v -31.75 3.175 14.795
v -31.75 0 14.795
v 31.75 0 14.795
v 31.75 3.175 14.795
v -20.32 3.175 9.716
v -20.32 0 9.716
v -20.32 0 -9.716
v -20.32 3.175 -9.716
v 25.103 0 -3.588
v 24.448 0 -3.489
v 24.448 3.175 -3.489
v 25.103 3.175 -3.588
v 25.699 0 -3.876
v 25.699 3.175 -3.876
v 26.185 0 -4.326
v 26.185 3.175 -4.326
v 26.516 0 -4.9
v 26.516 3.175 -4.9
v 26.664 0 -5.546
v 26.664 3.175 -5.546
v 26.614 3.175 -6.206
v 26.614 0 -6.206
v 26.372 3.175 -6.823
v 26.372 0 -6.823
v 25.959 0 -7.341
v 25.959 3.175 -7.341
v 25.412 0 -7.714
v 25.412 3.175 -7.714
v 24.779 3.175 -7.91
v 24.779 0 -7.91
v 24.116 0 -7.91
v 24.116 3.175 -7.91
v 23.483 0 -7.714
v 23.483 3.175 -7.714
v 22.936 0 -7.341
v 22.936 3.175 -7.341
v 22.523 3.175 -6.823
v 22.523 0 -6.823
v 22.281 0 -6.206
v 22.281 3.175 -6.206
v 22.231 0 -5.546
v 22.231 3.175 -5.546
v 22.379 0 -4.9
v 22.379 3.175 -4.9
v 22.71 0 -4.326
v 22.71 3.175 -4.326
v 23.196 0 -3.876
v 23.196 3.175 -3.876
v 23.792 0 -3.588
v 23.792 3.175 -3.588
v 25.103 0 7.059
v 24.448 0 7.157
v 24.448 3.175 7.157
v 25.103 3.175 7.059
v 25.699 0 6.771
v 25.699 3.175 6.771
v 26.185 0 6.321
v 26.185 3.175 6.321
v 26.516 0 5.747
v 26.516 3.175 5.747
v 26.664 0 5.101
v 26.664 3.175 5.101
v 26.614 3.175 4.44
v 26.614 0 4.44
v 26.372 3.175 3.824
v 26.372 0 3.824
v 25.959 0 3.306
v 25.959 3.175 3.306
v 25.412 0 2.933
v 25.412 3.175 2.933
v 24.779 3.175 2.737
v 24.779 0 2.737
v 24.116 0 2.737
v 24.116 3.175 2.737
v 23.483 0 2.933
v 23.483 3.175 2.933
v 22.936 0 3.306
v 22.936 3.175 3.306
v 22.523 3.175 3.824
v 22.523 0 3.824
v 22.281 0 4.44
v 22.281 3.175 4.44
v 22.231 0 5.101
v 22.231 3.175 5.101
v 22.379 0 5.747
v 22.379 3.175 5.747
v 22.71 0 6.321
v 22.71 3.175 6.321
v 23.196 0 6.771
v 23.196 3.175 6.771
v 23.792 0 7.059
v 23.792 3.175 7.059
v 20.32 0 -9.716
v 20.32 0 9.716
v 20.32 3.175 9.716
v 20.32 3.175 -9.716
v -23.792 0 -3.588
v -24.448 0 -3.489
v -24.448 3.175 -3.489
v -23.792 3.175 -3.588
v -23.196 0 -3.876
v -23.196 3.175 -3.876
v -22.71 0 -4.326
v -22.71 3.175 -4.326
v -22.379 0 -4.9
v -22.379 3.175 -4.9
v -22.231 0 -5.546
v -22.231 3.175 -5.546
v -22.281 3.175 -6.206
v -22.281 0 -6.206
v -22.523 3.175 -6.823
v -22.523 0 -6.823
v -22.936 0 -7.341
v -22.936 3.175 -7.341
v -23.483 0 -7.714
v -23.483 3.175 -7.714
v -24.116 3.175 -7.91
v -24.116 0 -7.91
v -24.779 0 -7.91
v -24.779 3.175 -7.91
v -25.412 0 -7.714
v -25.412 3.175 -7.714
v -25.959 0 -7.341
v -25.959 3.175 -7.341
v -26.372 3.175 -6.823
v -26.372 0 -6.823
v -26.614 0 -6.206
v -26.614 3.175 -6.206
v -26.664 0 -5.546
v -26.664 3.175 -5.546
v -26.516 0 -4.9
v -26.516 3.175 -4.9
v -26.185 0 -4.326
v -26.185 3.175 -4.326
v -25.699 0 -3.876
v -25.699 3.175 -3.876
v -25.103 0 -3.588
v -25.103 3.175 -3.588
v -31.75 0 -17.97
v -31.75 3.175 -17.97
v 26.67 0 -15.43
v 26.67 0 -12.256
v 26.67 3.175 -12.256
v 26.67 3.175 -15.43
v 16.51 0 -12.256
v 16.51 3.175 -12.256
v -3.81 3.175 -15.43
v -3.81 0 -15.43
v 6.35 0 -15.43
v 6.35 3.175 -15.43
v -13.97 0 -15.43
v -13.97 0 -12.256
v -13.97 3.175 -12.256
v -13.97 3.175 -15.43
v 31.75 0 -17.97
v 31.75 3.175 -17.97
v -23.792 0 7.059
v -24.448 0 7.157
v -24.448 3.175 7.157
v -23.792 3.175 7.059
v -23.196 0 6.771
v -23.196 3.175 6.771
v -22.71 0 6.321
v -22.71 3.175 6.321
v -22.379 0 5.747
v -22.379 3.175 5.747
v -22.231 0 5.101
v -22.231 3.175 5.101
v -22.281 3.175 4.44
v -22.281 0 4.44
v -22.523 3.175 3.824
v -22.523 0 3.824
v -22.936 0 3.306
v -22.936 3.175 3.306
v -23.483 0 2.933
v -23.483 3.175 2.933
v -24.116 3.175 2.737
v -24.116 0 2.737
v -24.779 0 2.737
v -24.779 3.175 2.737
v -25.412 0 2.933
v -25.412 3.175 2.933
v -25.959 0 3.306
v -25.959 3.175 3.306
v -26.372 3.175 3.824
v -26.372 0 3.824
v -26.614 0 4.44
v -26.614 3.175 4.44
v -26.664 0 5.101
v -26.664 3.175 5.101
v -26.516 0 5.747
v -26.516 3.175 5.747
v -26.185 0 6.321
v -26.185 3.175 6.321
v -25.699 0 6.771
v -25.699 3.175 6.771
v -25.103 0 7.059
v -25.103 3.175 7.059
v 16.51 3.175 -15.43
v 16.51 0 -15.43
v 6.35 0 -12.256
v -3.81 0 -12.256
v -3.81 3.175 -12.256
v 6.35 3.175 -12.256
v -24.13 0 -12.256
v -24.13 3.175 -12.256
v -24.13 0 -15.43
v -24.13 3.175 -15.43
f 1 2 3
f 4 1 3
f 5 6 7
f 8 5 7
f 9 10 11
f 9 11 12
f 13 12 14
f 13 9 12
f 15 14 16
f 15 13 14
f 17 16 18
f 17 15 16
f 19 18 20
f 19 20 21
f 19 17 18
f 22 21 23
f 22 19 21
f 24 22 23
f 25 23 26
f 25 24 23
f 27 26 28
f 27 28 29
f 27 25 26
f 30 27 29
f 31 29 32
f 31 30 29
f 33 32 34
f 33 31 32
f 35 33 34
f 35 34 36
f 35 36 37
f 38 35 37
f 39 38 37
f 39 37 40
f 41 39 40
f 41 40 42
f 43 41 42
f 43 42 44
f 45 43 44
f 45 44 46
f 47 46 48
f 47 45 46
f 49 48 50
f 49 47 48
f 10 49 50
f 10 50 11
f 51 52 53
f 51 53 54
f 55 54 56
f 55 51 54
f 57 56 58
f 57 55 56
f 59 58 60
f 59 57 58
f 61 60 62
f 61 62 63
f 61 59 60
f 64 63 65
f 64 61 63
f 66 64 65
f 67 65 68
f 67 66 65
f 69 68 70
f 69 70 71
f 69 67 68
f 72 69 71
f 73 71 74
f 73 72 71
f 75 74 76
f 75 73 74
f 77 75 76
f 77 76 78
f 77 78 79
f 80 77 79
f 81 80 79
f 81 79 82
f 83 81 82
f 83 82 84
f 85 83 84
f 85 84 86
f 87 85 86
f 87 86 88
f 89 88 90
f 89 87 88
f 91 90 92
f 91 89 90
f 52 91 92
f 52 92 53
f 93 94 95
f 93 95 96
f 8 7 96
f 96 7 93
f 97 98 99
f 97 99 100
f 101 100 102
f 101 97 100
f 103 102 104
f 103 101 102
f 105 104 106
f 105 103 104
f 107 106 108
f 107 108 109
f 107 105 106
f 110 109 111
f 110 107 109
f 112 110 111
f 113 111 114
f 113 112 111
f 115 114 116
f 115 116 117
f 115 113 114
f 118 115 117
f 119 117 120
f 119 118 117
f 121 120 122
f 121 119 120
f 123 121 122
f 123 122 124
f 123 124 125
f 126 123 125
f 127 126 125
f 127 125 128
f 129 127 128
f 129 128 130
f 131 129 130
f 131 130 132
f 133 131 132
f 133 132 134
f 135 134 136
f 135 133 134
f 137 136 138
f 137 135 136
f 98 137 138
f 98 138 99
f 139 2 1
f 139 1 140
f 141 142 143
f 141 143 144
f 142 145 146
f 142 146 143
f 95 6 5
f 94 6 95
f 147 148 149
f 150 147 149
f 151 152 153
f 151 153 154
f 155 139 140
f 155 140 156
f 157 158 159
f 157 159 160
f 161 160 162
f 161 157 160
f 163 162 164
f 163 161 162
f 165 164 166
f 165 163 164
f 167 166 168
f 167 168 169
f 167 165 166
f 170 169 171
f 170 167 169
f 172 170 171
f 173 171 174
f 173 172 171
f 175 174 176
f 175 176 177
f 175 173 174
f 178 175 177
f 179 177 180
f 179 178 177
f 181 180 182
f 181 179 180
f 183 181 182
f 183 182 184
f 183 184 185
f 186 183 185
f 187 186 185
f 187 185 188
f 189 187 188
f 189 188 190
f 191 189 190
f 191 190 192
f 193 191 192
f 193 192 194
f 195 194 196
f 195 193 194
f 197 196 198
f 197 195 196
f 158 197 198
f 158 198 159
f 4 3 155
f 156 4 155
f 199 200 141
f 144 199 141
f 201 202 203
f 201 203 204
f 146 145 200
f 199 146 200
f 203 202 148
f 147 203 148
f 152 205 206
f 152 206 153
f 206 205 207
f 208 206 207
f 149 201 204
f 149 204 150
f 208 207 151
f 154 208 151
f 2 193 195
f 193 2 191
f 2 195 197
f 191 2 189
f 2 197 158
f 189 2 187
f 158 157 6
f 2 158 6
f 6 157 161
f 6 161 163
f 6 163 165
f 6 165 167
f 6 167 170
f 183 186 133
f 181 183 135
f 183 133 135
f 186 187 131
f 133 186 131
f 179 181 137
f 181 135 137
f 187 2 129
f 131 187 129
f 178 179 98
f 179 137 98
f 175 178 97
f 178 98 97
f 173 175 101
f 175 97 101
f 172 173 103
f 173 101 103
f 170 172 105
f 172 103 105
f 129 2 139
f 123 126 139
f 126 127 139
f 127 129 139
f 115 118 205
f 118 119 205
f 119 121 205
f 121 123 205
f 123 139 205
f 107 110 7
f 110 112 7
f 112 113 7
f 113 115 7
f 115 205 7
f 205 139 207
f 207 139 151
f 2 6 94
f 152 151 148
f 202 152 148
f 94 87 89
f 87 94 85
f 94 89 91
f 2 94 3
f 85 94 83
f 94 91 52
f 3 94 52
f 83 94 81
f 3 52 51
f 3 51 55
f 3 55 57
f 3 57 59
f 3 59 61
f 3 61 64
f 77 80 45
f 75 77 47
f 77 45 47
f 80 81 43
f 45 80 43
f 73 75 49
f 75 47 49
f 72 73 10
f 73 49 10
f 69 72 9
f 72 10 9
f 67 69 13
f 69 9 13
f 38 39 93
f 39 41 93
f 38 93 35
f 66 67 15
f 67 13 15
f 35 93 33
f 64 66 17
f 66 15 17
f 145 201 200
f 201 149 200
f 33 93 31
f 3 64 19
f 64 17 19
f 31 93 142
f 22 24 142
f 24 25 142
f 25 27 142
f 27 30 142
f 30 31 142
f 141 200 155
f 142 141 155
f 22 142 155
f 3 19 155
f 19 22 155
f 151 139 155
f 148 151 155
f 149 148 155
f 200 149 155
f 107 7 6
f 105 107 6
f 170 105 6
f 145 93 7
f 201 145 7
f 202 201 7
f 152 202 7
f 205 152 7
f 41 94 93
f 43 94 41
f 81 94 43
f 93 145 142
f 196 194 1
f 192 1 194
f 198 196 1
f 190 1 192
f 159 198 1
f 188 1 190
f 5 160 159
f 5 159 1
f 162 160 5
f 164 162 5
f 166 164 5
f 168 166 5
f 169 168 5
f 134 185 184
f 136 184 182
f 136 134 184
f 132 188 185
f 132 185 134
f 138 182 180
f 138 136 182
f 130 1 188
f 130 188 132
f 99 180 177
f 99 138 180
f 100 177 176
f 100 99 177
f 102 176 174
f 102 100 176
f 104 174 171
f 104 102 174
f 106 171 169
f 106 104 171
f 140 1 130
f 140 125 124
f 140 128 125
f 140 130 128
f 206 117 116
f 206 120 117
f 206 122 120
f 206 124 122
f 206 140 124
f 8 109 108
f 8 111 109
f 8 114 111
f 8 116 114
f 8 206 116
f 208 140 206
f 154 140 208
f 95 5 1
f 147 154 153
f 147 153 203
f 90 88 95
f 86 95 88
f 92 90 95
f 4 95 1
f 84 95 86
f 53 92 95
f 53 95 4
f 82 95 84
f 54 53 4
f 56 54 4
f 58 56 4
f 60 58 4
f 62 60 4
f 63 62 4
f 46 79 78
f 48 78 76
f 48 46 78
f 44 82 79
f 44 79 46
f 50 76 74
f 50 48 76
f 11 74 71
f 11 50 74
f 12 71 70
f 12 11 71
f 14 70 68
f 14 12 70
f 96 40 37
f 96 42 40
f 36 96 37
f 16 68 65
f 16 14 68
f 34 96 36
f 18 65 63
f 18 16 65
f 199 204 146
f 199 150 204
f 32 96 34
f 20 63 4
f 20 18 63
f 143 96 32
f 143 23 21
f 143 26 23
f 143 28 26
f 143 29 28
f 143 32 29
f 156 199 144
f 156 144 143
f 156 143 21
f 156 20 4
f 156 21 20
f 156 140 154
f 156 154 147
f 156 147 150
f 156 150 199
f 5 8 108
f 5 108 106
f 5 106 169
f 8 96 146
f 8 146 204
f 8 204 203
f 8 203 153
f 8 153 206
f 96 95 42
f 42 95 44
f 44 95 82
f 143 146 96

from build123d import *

# Parameters (mm, degrees)
SKETCH1_W           = 63.5
SKETCH1_H           = 32.766
SKETCH1_R           = 2.2225
SKETCH1_W_2         = 10.16
SKETCH1_H_2         = 3.175
SKETCH1_W_3         = 40.64
SKETCH1_H_3         = 19.431
BOSS_EXTRUDE2_DEPTH = 3.175


with BuildPart() as part:
    # Sketch1 → Boss-Extrude2 (new body)
    with BuildSketch(Plane(origin=(0, 0, 0), x_dir=(1, 0, 0), z_dir=(0, 1, 0))):
        with Locations((0, 1.5875)):
            Rectangle(SKETCH1_W, SKETCH1_H)
        with Locations(Location((-24.4475, 5.711910092, 0), (0, 0, 270))):
            Circle(SKETCH1_R, mode=Mode.SUBTRACT)
        with Locations(Location((-24.4475, -4.93498923, 0), (0, 0, 270))):
            Circle(SKETCH1_R, mode=Mode.SUBTRACT)
        with Locations(Location((24.4475, 5.711910092, 0), (0, 0, 270))):
            Circle(SKETCH1_R, mode=Mode.SUBTRACT)
        with Locations(Location((24.4475, -4.93498923, 0), (0, 0, 270))):
            Circle(SKETCH1_R, mode=Mode.SUBTRACT)
        with Locations((21.59, 13.843)):
            Rectangle(SKETCH1_W_2, SKETCH1_H_2, mode=Mode.SUBTRACT)
        with Locations((1.27, 13.843)):
            Rectangle(SKETCH1_W_2, SKETCH1_H_2, mode=Mode.SUBTRACT)
        with Locations((-19.05, 13.843)):
            Rectangle(SKETCH1_W_2, SKETCH1_H_2, mode=Mode.SUBTRACT)
        Rectangle(SKETCH1_W_3, SKETCH1_H_3, mode=Mode.SUBTRACT)
    extrude(amount=BOSS_EXTRUDE2_DEPTH)


solid = part.part
